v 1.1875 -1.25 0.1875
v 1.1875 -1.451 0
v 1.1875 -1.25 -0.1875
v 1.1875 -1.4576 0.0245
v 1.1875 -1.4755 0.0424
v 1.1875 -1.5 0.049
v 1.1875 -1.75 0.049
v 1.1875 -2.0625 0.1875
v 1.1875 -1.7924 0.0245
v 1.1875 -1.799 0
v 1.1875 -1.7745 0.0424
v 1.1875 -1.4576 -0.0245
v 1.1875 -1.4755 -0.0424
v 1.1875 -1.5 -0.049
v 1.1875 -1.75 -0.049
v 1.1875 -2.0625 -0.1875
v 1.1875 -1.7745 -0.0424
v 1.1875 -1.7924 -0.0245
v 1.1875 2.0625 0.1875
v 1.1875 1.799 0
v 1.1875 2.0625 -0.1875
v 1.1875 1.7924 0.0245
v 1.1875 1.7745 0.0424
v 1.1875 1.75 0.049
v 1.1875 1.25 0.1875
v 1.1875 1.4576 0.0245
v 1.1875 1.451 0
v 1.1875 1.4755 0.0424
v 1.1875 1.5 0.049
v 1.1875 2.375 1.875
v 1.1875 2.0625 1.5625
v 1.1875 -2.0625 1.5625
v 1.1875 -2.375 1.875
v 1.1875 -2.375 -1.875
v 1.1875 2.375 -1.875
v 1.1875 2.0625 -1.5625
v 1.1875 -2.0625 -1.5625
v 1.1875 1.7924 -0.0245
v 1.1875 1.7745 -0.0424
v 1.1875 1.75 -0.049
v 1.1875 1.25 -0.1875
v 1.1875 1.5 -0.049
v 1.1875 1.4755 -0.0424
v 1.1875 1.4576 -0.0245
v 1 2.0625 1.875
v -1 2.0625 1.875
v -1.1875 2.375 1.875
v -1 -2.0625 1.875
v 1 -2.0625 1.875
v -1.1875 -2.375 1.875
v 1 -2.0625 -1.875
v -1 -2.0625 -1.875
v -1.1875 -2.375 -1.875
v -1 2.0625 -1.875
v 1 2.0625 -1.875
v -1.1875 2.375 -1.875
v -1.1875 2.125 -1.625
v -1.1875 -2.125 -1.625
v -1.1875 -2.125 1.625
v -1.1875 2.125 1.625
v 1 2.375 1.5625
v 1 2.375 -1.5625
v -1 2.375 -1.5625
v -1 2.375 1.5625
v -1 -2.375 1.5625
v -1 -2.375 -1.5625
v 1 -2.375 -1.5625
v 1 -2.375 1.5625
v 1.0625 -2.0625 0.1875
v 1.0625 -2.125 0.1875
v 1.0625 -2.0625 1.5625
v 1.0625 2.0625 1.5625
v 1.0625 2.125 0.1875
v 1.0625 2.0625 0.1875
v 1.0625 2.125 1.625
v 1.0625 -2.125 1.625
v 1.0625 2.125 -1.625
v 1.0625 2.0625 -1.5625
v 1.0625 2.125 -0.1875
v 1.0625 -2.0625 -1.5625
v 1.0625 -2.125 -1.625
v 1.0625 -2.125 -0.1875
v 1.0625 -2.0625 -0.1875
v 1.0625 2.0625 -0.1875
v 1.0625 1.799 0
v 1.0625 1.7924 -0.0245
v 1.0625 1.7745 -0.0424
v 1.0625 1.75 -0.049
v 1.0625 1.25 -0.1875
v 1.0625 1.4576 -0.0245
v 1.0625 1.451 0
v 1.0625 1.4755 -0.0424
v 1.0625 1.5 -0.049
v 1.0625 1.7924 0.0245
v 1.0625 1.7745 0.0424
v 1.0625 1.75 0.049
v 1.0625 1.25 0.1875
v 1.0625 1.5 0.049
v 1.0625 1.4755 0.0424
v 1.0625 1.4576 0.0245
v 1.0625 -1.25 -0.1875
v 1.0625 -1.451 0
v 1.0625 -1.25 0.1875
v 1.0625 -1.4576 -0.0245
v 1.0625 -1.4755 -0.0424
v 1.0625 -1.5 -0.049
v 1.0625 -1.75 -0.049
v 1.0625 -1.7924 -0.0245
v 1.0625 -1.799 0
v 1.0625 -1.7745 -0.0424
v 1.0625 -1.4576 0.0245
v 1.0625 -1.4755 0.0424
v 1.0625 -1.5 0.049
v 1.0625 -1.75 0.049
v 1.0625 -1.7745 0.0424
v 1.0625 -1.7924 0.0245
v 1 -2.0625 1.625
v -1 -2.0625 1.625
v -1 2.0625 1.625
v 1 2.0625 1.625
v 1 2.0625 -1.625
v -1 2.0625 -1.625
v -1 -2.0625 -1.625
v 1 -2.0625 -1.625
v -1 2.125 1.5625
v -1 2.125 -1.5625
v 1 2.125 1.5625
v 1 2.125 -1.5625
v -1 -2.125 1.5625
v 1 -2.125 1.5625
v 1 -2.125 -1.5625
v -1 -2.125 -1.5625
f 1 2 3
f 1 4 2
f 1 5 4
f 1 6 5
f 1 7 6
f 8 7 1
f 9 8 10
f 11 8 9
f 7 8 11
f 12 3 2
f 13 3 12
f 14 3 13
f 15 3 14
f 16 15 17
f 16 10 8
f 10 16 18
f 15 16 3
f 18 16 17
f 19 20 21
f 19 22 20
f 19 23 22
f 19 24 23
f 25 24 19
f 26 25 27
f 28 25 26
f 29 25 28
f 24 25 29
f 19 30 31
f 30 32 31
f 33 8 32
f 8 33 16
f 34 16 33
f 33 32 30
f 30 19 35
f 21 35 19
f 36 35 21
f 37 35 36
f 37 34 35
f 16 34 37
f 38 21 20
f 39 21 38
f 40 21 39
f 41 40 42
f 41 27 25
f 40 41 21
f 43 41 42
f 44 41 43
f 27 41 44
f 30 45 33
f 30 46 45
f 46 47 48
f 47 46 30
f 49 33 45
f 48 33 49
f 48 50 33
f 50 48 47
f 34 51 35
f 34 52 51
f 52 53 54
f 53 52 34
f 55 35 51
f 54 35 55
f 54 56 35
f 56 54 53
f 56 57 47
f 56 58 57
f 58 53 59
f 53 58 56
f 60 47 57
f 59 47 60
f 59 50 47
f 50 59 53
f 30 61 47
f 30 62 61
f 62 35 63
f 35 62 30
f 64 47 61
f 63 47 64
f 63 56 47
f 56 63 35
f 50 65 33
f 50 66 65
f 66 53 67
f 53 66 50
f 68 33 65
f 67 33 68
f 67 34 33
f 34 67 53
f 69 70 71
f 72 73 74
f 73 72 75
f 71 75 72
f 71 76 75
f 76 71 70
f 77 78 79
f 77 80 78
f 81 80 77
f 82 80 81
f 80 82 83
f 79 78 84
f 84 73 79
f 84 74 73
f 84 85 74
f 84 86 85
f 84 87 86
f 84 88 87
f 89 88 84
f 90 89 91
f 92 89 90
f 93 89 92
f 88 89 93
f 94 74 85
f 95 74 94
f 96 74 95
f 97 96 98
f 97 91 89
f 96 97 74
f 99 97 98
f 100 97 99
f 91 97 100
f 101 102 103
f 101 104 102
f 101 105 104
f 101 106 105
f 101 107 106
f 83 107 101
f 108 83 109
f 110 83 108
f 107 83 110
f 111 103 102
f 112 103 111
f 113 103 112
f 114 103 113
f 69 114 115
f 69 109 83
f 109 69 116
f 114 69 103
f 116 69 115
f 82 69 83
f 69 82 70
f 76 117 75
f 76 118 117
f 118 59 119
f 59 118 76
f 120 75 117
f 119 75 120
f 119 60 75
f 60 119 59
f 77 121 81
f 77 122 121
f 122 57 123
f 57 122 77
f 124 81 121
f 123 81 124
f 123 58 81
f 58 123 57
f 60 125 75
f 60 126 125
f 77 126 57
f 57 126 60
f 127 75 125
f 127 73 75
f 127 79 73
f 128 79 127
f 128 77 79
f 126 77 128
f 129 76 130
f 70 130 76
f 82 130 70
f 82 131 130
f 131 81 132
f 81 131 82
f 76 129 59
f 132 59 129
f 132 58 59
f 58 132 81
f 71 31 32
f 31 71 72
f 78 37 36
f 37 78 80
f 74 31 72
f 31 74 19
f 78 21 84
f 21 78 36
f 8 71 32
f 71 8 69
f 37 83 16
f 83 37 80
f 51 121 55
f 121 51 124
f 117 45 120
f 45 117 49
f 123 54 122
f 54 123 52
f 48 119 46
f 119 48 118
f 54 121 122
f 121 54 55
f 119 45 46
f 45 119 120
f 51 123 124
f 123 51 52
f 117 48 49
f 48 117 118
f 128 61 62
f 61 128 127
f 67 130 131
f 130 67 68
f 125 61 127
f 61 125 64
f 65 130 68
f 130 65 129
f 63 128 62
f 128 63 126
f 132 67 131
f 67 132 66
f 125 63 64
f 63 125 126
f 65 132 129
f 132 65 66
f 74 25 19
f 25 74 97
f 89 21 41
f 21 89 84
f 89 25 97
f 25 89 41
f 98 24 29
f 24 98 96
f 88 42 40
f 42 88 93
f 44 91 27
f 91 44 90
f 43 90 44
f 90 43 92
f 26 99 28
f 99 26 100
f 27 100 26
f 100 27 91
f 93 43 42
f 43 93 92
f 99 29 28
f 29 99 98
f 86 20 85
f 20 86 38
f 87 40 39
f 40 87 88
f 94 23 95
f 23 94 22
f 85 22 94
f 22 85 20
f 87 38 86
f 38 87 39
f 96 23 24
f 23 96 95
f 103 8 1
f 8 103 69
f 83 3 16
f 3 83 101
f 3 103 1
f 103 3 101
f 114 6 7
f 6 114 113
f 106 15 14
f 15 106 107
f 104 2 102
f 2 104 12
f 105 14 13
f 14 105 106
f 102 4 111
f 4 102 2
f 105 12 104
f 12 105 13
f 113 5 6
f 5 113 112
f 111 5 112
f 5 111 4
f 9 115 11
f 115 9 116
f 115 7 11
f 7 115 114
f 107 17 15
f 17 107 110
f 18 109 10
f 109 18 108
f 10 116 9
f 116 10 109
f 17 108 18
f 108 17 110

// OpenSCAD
// ----------------------------------------------------------------------------------------------------
// PROJECT INFORMATION

// NAME:  Yamaha TW200 Taillight Guard
// REVISION:  A1
// START DATE:  8/1/2023
// CURRENT VERSION DATE:  8/1/2023
// LICENSE:  GPLv3
// AUTHOR:  Justin Grimes (@zelon88)
// DESCRIPTION:  A taillight guard for the 1987 - Present Yamaha TW200 Motorcycle.
// ----------------------------------------------------------------------------------------------------

// ----------------------------------------------------------------------------------------------------
// PART INFORMATION

// NAME:  TW200 Taillight Guard Main Body
// REVISION:  A1
// START DATE:  8/1/2023
// CURRENT VERSION DATE:  8/3/2023
// AUTHOR:  Justin Grimes (@zelon88)
// CONSTRUCTION METHOD:  3D Printed
// MATERIALS REQUIRED:  PLA or ABS Filament
// DESCRIPTION:  
//    A taillight guard Main Body.
// FILE NAME:  TW200_Taillight_Guard_000.scad
// ----------------------------------------------------------------------------------------------------

// ----------------------------------------------------------------------------------------------------
// PRINTER CONFIGURATION
//   This item is not meant to be printed.
//   This item is a base required by other variants of the finished products.
// ----------------------------------------------------------------------------------------------------

// ----------------------------------------------------------------------------------------------------
// MANUFACTURING INSTRUCTIONS
//   This item is not meant to be manufactured.
//   This item is a base required by other variants of the finished products.
// ----------------------------------------------------------------------------------------------------

// ----------------------------------------------------------------------------------------------------
// GEOMETRY
// TW200 Taillight Guard Main Body.
module TW200_Taillight_Guard_000 () { 

  // Main body of taillight guard.
  difference() { 

    // This is a solid cube that we will hollow out and cut open sides out of.
    // This will create a cage around the tail light.
    cube([2.375, 4.75, 3.75], center=true);

    // Center hole.
    translate([-0.125, 0, 0]) cube([2.375, 4.25, 3.25], center=true); 

    // Remove rear material.
    cube([3, 4.125, 3.125], center=true);

    // Remove top & bottom  material.
    cube([2, 4.125, 4], center=true);

    // Remove left & right side material.
    cube([2, 5, 3.125], center=true); }

// Right Mounting Bracket.
difference() { 
  // Main body of right mounting bracket.
  translate([1.125, 1.75, 0]) cube([0.125, 1, 0.375], center=true);

  // Remove screw slot.
  translate([1.125, 1.625, 0]) cube([0.125, 0.25, 0.098], center=true);
  translate([1.125, 1.500, 0]) rotate([0, 90, 0]) cylinder(r=0.049, h=0.125, $fn=12, center=true);
  translate([1.125, 1.750, 0]) rotate([0, 90, 0]) cylinder(r=0.049, h=0.125, $fn=12, center=true); }

// Left Mounting Bracket.
difference() { 
  // Main body of left mounting bracket.
  translate([1.125, -1.75, 0]) cube([0.125, 1, 0.375], center=true);

  // Remove screw slot.
  translate([1.125, -1.625, 0]) cube([0.125, 0.25, 0.098], center=true);
  translate([1.125, -1.500, 0]) rotate([0, 90, 0]) cylinder(r=0.049, h=0.125, $fn=12, center=true);
  translate([1.125, -1.750, 0]) rotate([0, 90, 0]) cylinder(r=0.049, h=0.125, $fn=12, center=true);
} }

// Render the object. 
// Comment or uncomment as needed.
TW200_Taillight_Guard_000();
// ----------------------------------------------------------------------------------------------------
